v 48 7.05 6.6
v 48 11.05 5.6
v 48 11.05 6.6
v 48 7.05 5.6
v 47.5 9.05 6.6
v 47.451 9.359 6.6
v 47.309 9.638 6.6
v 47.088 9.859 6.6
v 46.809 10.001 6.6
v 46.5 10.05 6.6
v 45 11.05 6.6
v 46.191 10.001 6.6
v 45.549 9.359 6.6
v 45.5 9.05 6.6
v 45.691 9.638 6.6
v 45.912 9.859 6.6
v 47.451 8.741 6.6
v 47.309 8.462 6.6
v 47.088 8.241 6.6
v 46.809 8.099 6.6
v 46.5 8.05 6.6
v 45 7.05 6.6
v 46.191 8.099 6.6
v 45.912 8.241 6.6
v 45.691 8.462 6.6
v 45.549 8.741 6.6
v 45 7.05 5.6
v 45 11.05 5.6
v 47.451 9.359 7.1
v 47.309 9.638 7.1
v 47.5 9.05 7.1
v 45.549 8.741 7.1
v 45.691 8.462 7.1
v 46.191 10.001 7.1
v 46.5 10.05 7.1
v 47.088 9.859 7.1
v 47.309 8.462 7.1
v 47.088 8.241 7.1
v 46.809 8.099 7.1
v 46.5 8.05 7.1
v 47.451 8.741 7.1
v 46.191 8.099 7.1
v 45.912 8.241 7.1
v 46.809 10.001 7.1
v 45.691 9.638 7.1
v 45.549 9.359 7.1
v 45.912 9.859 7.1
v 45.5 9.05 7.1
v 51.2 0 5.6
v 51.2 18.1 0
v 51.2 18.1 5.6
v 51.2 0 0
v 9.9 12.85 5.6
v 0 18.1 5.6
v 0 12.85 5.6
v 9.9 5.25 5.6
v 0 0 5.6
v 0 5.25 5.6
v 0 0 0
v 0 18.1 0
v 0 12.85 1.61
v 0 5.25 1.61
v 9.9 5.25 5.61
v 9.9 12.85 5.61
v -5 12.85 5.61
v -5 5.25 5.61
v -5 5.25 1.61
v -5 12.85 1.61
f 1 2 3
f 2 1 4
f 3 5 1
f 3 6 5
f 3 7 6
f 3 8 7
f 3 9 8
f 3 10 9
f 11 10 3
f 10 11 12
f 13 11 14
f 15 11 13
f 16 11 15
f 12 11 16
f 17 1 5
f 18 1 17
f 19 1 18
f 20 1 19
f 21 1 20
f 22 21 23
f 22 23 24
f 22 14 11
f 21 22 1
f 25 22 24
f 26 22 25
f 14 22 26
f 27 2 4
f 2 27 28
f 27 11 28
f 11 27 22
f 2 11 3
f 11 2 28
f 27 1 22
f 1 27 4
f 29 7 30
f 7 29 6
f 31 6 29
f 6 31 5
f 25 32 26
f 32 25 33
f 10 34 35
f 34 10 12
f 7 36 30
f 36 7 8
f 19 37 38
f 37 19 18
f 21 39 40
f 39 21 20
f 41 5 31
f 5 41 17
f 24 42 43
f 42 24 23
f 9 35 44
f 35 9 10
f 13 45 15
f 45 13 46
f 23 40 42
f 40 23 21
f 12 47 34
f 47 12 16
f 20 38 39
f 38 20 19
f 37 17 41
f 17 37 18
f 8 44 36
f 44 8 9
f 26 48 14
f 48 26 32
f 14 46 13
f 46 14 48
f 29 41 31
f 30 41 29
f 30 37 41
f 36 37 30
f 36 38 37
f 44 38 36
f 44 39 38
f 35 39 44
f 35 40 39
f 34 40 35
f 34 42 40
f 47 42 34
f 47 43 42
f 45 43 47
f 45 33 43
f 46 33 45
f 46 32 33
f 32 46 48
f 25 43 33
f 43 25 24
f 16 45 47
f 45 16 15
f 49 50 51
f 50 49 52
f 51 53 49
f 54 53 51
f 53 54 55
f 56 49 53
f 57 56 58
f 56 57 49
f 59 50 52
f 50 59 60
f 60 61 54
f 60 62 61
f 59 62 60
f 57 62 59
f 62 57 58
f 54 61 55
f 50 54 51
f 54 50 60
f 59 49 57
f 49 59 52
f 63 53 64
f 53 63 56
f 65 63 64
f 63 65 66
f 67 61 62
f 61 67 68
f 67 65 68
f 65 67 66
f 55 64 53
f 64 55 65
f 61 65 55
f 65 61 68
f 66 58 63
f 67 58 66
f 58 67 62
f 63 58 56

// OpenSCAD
// Teensy++ 2 
// Loic - Novemeber 2017


teensyplusplus2();

board_length 	= 51.2;
board_width		= 18.1;
board_height	= 1.6 + 4;	// board + usb connector

// reset button
module resetButton()
{
	color("grey")
		cube(size=[3,4,1], center=false);

	translate([1.5,2,1])
	color("black")
		cylinder(h=0.5, r=1, center=false, $fn=20);
}

module microUSBConnector()
{
	cube(size=[9.9 + 5,7.6,4], center=false);	// + 5 is dummy long for thick wall
}

//board
module teensyplusplus2()
{
	color("green")
		cube(size=[board_length,board_width,board_height], center=false);

	translate([45,9.05-2,board_height])
		resetButton();

	translate([-5,5.25,1.61])
		microUSBConnector();
}
